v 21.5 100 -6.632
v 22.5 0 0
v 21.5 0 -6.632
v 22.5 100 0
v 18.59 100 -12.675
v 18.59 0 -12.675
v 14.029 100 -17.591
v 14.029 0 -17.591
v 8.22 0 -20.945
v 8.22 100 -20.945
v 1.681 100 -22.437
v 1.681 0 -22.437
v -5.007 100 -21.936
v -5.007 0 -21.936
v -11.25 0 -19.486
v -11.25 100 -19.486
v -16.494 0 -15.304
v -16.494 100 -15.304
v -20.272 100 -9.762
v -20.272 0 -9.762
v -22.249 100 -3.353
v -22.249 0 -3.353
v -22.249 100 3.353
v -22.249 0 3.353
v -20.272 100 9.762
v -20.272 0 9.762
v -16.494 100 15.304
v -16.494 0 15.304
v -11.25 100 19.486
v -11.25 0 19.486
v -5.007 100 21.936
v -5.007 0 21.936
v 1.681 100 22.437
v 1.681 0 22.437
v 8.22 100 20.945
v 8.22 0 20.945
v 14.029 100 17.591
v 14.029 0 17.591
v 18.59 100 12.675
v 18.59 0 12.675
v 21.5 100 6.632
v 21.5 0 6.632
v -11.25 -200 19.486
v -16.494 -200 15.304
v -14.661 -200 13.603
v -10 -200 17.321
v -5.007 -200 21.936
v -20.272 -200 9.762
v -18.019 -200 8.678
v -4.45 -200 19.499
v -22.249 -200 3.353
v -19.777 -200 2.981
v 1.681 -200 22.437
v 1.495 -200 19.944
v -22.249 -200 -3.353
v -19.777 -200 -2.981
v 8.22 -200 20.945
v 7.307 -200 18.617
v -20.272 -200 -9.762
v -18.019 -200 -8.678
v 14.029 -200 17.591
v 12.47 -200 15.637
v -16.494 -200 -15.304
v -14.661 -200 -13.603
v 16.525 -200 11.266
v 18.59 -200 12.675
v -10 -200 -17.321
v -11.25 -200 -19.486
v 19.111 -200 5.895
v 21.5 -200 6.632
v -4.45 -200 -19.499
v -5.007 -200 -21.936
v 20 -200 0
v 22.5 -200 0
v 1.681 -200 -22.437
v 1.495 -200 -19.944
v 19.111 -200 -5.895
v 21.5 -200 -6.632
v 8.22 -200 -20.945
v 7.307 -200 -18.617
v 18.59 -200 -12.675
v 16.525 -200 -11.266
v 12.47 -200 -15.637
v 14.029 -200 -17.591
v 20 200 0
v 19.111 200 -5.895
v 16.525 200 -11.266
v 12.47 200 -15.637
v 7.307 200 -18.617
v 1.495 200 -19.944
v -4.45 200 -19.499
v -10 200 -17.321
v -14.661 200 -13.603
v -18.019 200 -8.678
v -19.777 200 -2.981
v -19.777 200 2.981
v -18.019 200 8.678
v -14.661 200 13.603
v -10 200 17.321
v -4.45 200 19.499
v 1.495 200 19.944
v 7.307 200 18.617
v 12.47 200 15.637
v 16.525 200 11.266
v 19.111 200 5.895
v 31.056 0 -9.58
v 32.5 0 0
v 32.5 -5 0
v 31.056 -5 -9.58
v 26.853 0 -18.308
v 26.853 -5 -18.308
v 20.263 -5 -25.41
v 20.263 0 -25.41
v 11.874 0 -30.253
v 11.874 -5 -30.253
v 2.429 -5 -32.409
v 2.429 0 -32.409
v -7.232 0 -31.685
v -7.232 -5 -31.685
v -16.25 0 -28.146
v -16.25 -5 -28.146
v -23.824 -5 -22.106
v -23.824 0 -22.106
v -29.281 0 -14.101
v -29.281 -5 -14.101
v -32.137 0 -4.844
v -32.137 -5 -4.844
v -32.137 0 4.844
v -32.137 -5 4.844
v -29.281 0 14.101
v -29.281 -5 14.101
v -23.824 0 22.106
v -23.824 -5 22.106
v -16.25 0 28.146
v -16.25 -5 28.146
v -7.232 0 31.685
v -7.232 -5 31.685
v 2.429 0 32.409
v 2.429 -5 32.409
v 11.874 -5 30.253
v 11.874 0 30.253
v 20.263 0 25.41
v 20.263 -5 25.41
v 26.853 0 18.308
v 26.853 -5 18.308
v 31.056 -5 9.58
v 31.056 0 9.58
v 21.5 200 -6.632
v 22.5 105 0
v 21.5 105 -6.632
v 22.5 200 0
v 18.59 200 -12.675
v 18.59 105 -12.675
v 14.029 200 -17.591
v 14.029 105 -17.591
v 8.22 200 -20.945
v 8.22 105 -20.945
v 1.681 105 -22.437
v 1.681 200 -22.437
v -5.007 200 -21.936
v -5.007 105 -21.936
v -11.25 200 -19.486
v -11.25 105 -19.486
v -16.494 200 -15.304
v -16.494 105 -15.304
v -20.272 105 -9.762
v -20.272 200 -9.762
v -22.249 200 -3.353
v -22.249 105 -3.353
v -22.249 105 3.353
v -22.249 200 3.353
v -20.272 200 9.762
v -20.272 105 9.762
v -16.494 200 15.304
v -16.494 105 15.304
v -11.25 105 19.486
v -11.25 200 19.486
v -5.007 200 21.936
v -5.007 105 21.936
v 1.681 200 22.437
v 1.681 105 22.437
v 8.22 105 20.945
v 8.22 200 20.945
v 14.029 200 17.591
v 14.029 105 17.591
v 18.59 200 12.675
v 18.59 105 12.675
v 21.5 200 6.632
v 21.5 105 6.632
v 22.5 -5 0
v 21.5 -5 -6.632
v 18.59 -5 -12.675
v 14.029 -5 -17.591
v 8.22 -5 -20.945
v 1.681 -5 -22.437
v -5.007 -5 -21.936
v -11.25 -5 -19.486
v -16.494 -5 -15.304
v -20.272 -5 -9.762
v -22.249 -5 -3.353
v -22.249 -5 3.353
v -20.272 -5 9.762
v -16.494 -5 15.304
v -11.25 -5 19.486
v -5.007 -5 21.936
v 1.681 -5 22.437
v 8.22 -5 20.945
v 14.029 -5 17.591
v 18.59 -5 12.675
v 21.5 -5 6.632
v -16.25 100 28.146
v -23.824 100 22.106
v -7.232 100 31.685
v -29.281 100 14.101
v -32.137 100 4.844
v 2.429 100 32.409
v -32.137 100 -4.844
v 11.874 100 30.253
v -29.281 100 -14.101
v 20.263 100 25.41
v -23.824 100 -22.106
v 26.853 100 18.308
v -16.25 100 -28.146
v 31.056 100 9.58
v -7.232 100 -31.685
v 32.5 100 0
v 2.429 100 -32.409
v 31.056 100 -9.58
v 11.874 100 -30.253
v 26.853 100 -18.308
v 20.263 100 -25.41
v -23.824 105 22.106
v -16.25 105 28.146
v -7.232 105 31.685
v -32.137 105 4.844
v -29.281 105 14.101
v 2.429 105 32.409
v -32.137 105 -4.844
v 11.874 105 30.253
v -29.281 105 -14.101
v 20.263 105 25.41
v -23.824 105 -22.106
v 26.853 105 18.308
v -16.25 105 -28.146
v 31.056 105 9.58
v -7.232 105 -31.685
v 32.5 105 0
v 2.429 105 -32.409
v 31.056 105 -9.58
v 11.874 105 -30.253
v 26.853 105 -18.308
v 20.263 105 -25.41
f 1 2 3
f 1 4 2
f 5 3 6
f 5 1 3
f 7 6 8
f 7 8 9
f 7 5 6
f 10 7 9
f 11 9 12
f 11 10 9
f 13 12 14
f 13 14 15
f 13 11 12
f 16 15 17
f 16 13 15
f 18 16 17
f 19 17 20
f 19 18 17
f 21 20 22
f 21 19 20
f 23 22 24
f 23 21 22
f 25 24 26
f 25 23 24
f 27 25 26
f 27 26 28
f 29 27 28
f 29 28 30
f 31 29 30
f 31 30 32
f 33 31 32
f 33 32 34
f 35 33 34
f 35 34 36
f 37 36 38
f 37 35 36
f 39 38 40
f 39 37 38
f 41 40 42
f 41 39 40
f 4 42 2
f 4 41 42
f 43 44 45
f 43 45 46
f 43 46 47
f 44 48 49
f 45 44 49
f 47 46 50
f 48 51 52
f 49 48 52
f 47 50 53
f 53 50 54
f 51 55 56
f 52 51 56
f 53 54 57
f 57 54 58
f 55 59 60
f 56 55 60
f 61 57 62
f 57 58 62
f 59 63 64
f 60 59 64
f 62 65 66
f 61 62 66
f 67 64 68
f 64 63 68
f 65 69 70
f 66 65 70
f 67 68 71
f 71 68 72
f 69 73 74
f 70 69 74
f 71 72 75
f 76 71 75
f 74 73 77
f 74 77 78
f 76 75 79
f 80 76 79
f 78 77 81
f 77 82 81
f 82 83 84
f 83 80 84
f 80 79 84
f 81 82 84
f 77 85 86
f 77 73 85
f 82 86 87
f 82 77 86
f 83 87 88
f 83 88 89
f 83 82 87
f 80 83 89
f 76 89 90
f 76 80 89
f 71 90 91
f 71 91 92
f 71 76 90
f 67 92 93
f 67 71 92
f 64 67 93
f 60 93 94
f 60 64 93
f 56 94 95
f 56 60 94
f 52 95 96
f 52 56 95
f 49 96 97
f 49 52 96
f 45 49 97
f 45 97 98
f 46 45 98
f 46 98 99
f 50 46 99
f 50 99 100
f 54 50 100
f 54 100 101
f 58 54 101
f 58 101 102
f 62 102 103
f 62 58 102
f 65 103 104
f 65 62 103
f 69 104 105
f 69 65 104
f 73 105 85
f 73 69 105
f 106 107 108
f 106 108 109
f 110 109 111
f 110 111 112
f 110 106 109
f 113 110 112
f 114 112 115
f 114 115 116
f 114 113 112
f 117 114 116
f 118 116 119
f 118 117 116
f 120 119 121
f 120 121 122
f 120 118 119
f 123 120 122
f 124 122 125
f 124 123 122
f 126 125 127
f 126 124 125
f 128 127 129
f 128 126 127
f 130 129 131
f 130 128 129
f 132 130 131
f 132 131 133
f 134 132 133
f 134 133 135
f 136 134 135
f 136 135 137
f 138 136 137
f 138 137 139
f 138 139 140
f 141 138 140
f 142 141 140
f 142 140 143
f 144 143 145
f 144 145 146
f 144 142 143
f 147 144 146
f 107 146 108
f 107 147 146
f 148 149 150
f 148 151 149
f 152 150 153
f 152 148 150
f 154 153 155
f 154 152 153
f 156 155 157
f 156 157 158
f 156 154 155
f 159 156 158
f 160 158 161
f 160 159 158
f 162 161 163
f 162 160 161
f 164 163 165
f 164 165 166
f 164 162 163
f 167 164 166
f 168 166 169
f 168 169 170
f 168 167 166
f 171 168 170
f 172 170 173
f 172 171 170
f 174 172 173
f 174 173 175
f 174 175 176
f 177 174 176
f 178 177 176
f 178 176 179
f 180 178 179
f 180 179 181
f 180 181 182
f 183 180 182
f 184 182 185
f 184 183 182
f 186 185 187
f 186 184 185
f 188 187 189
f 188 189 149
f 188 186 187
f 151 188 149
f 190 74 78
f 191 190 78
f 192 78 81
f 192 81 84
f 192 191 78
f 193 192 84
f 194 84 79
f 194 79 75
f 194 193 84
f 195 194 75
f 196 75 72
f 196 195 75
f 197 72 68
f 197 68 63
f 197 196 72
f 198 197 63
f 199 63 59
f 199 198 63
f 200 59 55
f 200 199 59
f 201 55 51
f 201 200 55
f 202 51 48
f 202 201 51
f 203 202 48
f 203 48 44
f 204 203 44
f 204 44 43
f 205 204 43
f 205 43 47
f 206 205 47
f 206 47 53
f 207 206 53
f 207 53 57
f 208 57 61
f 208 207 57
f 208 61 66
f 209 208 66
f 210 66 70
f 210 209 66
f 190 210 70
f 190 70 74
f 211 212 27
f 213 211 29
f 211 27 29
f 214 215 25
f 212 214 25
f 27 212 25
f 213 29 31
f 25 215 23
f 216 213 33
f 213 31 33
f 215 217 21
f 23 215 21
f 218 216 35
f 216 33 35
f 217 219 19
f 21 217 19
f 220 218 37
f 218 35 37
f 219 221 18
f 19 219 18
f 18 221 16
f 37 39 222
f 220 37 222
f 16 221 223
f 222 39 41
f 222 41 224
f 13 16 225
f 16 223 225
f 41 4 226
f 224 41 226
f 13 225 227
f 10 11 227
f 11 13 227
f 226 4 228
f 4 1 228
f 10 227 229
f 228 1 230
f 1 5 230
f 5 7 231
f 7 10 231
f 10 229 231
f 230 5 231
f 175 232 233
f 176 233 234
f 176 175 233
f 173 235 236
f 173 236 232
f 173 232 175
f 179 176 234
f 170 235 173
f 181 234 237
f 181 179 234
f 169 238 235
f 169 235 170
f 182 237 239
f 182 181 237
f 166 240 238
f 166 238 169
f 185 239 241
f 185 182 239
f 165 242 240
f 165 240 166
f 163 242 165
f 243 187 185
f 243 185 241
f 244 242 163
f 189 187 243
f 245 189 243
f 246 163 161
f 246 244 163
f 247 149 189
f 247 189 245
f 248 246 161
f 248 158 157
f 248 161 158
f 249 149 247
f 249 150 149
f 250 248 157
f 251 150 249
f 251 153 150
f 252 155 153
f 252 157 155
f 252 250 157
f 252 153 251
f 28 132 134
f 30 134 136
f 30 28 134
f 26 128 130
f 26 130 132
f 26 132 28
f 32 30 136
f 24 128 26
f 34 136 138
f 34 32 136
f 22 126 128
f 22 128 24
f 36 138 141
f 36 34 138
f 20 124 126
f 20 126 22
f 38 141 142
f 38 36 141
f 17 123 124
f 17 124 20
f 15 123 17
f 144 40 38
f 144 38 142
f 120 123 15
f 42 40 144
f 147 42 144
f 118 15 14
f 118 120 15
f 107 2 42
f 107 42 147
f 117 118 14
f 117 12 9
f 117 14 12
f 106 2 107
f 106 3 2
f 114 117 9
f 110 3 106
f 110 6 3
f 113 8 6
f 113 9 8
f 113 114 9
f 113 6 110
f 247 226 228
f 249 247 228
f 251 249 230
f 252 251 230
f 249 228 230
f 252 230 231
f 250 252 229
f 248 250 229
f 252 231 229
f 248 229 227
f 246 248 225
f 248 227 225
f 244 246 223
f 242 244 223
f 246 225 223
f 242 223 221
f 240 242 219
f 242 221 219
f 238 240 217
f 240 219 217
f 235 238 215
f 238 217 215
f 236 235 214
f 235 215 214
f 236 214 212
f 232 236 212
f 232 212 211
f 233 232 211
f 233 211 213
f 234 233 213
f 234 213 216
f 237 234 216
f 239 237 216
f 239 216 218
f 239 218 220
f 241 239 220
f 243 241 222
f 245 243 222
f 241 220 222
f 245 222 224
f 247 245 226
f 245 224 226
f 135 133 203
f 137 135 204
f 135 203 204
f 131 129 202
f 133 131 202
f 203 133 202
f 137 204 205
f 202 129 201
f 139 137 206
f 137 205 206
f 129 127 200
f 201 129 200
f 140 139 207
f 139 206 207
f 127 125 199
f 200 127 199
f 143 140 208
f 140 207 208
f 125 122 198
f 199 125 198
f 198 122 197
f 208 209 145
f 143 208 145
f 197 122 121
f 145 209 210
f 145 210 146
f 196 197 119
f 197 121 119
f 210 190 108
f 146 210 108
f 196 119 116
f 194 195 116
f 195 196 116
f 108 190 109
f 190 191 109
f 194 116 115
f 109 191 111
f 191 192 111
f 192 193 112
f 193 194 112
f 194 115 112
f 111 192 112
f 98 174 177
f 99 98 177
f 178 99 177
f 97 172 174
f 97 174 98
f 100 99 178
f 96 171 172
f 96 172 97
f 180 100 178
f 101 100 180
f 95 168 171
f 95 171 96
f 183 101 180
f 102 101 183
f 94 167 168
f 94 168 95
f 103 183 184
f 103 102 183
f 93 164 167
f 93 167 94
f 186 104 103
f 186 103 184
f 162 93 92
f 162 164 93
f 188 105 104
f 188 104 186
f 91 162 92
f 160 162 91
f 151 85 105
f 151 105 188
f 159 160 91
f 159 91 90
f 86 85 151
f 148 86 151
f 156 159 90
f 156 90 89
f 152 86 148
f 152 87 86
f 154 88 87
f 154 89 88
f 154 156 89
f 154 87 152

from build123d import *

# Parameters (mm, degrees)
SKETCH1_R           = 22.5
SKETCH1_R_2         = 20
BOSS_EXTRUDE1_DEPTH = 200
SKETCH2_R           = 32.5
SKETCH2_R_2         = 22.5
BOSS_EXTRUDE2_DEPTH = 5
SKETCH3_R           = 32.5
SKETCH3_R_2         = 22.5
BOSS_EXTRUDE3_DEPTH = 5


with BuildPart() as part:
    # Sketch1 → Boss-Extrude1 (new body, symmetric)
    with BuildSketch(Plane(origin=(0, 0, 0), x_dir=(1, 0, 0), z_dir=(0, 1, 0))):
        Circle(SKETCH1_R)
        Circle(SKETCH1_R_2, mode=Mode.SUBTRACT)
    extrude(amount=BOSS_EXTRUDE1_DEPTH, both=True)

    # Sketch2 → Boss-Extrude2 (add)
    with BuildSketch(Plane(origin=(0, 100, 0), x_dir=(1, 0, 0), z_dir=(0, 1, 0))):
        Circle(SKETCH2_R)
        Circle(SKETCH2_R_2, mode=Mode.SUBTRACT)
    extrude(amount=BOSS_EXTRUDE2_DEPTH)

    # Sketch3 → Boss-Extrude3 (add)
    with BuildSketch(Plane(origin=(0, 0, 0), x_dir=(1, 0, 0), z_dir=(0, 1, 0))):
        Circle(SKETCH3_R)
        Circle(SKETCH3_R_2, mode=Mode.SUBTRACT)
    extrude(amount=-BOSS_EXTRUDE3_DEPTH)


solid = part.part
